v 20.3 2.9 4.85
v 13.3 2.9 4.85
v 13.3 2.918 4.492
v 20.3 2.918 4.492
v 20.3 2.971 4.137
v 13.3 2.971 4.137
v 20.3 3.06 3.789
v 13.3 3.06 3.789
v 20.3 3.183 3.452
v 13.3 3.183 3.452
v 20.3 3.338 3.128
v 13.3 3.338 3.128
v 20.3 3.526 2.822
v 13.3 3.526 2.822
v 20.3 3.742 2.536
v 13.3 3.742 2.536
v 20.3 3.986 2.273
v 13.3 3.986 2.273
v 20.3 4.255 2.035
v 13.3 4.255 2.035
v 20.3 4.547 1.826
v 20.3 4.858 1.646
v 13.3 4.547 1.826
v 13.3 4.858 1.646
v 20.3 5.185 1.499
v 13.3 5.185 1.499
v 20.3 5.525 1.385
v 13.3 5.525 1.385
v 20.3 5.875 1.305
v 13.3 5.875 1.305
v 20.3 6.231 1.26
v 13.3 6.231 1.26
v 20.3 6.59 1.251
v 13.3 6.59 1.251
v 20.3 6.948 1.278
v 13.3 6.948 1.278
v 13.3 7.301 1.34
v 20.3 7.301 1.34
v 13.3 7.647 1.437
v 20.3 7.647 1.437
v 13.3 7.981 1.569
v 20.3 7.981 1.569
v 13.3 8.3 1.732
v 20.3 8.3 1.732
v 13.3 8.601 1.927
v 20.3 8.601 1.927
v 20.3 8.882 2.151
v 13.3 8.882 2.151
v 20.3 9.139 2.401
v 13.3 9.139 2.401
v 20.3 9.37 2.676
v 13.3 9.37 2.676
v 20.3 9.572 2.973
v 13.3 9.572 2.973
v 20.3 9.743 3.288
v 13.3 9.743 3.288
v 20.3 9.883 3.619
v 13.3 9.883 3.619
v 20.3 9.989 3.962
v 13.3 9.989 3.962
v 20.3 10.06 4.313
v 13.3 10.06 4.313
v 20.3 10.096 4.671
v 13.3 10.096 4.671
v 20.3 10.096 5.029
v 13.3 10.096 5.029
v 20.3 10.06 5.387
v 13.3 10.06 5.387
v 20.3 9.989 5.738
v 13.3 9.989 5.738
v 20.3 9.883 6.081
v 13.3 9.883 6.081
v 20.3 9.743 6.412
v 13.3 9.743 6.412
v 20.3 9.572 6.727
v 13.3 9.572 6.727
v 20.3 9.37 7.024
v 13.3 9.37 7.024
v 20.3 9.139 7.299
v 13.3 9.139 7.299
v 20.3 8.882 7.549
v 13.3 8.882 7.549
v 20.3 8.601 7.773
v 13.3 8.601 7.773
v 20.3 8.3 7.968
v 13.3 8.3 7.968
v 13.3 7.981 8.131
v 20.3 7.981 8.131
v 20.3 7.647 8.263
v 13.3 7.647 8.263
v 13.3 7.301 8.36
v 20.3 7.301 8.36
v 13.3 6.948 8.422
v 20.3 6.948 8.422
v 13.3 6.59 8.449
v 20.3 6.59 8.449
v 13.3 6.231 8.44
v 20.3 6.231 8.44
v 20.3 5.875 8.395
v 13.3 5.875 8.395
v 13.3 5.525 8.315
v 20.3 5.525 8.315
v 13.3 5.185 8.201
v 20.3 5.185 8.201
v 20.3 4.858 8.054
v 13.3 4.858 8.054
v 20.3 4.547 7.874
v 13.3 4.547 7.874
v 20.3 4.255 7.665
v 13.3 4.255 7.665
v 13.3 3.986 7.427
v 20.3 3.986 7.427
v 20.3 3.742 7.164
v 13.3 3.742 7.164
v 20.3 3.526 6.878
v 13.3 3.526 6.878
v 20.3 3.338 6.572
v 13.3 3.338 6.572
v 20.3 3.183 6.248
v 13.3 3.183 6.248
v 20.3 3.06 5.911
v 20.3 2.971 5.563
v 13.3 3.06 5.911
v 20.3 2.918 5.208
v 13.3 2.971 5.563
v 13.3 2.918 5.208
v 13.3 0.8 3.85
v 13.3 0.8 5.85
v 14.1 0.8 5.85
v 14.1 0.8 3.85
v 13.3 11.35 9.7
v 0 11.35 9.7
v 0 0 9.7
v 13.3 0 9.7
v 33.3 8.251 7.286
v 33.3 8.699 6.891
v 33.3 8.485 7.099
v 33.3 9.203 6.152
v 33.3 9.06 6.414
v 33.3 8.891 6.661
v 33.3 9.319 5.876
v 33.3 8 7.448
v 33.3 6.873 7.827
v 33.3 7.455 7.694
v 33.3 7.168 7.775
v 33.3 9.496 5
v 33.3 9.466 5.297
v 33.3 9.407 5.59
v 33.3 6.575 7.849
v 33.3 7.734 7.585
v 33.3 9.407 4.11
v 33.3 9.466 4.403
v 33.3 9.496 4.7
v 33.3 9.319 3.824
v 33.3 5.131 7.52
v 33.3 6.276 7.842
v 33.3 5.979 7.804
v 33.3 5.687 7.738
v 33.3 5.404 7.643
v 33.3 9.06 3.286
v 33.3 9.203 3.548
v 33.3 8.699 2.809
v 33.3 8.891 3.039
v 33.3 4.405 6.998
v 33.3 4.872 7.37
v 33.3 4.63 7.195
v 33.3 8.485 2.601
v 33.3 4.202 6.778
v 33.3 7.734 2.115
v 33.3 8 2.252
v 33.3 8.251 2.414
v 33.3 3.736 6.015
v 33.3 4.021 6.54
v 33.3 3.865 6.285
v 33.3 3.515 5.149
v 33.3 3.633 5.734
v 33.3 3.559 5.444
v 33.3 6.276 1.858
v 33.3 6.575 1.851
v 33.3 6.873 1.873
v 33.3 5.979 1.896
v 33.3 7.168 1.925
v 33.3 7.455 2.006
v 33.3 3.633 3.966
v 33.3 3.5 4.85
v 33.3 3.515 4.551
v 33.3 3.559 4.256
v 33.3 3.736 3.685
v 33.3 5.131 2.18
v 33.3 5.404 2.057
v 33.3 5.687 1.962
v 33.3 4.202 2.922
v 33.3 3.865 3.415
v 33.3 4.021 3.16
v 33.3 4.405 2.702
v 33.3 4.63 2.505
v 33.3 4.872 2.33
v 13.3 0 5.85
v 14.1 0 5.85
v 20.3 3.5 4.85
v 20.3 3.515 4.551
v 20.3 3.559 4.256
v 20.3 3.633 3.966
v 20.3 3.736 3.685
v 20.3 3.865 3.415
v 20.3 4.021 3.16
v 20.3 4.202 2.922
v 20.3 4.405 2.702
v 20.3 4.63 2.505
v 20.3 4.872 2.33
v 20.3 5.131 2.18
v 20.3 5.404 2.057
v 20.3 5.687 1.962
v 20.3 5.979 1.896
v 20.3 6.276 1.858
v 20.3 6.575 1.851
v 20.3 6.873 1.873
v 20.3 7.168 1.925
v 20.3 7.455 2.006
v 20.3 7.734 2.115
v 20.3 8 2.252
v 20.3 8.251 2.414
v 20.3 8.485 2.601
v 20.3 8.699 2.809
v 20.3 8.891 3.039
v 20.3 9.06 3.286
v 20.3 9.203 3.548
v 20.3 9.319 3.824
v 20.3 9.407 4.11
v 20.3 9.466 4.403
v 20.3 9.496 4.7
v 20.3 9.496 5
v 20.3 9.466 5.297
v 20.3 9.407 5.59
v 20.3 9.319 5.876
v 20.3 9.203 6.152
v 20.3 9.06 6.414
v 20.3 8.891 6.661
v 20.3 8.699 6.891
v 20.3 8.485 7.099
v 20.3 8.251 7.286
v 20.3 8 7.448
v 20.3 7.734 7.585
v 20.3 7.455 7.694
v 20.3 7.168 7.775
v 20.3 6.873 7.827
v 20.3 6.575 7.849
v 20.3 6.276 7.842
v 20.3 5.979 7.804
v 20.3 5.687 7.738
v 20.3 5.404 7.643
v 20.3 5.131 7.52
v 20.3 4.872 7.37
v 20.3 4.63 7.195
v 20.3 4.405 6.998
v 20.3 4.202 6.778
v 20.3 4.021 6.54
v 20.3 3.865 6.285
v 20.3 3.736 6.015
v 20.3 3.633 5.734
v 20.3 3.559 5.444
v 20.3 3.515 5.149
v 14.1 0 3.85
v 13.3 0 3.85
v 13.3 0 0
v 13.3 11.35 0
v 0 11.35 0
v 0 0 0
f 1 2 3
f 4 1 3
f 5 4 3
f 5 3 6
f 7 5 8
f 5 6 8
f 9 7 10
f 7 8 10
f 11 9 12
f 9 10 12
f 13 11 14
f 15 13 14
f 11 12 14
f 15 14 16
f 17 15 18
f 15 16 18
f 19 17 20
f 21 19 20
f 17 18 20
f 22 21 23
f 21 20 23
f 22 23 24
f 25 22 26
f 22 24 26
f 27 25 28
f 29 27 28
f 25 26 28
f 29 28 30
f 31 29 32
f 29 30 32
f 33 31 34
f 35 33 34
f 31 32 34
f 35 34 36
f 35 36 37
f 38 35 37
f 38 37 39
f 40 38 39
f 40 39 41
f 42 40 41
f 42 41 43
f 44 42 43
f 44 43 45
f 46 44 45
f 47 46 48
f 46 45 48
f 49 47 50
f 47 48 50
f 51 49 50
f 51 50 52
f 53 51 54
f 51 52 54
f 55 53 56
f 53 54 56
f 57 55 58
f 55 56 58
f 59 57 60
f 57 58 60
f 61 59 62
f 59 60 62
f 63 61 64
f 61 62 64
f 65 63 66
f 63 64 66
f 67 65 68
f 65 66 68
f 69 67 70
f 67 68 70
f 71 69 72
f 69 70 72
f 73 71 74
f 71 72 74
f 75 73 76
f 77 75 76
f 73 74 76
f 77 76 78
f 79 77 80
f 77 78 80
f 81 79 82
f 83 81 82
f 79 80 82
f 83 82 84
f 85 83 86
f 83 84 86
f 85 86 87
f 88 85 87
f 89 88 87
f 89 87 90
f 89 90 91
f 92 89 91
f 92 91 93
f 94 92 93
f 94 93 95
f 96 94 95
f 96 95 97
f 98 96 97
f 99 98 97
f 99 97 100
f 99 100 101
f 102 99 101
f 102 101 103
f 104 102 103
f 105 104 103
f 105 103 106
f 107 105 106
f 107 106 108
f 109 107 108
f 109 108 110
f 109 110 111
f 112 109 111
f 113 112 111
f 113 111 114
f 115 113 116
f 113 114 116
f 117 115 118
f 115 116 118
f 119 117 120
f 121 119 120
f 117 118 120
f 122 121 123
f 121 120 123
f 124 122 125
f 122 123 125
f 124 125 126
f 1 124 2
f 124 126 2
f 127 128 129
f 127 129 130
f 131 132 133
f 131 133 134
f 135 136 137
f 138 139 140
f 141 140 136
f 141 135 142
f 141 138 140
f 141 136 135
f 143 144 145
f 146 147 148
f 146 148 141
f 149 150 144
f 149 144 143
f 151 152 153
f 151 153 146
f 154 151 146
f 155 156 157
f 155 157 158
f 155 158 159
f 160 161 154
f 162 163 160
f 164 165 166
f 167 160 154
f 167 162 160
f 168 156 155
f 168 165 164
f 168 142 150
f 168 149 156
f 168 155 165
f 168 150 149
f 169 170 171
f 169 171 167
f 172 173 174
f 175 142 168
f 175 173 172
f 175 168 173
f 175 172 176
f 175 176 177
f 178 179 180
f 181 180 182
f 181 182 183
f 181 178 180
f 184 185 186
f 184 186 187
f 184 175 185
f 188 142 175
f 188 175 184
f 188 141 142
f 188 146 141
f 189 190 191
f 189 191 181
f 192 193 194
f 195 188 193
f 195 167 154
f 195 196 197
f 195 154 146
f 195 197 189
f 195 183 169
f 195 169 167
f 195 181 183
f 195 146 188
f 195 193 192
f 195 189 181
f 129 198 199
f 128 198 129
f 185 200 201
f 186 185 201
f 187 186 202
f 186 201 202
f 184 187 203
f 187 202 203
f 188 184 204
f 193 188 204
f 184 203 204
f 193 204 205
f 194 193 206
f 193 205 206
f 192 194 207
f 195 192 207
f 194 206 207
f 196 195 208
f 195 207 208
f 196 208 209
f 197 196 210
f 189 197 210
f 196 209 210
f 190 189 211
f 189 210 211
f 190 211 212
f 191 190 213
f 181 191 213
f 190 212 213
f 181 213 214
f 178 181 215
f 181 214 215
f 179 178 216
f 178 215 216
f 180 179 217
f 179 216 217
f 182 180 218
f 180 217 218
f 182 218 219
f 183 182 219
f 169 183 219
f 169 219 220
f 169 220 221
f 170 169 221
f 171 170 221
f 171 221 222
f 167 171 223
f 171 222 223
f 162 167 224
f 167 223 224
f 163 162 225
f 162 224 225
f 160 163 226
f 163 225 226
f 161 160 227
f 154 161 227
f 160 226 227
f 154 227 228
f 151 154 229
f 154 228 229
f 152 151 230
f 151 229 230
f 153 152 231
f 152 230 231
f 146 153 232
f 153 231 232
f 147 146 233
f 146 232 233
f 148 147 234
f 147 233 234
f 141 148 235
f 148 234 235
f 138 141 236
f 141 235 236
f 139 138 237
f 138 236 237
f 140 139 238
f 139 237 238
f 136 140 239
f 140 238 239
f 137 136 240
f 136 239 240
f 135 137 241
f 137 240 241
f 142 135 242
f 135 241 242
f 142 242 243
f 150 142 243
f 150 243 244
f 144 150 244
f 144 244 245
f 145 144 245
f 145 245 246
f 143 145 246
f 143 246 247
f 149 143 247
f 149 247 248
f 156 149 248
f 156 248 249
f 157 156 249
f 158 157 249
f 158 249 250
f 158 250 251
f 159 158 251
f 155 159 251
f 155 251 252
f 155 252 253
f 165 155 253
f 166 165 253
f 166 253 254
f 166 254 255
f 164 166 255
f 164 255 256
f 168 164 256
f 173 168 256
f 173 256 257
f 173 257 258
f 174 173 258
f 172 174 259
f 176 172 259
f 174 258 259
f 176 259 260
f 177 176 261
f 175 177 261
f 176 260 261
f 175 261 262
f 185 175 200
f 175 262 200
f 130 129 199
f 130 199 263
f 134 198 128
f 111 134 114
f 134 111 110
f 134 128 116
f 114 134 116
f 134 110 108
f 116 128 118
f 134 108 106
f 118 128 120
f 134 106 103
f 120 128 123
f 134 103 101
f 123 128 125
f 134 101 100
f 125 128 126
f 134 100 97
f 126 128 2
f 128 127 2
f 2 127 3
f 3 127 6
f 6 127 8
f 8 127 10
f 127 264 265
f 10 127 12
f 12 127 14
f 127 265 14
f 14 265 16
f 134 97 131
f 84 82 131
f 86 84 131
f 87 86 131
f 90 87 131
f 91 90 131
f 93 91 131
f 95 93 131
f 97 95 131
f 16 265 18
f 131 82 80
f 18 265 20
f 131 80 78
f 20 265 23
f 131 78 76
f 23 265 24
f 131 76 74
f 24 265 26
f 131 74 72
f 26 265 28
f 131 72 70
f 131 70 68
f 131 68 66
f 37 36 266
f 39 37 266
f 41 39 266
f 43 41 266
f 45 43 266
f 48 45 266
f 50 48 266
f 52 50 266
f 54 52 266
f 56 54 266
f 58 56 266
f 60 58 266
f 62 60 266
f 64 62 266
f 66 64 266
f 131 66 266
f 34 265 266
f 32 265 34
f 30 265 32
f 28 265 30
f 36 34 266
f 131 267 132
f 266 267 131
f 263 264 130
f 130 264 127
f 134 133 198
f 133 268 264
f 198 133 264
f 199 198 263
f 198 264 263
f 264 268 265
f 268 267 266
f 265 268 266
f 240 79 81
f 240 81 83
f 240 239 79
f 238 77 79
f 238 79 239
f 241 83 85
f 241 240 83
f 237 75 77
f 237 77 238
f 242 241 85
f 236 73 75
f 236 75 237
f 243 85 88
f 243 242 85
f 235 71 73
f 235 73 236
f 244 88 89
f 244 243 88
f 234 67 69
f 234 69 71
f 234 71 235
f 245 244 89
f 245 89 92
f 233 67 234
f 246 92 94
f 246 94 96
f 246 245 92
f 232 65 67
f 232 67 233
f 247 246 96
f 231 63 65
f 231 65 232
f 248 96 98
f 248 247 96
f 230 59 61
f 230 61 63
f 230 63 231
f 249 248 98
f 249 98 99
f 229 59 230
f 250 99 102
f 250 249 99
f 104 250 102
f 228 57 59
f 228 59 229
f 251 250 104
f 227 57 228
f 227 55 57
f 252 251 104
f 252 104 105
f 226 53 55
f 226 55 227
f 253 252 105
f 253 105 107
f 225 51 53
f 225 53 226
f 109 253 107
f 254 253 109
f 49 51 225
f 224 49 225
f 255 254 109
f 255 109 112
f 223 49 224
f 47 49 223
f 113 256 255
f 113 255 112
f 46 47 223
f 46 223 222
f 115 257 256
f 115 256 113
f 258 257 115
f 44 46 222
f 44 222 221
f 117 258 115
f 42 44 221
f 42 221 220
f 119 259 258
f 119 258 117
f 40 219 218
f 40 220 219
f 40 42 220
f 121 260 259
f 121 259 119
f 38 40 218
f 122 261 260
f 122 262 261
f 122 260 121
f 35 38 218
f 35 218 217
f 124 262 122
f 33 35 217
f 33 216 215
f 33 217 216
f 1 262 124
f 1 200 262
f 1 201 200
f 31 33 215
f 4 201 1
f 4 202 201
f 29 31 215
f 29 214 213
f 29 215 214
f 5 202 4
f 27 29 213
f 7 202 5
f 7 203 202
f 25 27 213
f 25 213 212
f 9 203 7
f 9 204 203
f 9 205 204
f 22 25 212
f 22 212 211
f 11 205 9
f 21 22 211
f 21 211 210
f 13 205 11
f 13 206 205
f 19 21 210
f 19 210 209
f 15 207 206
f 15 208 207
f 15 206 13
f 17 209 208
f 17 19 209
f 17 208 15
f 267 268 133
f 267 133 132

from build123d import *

# Parameters (mm, degrees)
SKETCH1_W           = 13.3
SKETCH1_H           = 11.35
BOSS_EXTRUDE1_DEPTH = 9.7
SKETCH2_R           = 3.6
BOSS_EXTRUDE2_DEPTH = 7
SKETCH3_R           = 3
BOSS_EXTRUDE4_DEPTH = 13
SKETCH4_W           = 2
SKETCH4_H           = 0.8
BOSS_EXTRUDE5_DEPTH = 0.8


with BuildPart() as part:
    # Sketch1 → Boss-Extrude1 (new body)
    with BuildSketch(Plane.XY):
        with Locations((6.65, 5.675)):
            Rectangle(SKETCH1_W, SKETCH1_H)
    extrude(amount=BOSS_EXTRUDE1_DEPTH)

    # Sketch2 → Boss-Extrude2 (add)
    with BuildSketch(Plane(origin=(13.3, 0, 0), x_dir=(0, 0, -1), z_dir=(1, 0, 0))):
        with Locations(Location((-4.85, 6.5, 0), (0, 0, 270))):  # turned: the seam where the file's is
            Circle(SKETCH2_R)
    extrude(amount=BOSS_EXTRUDE2_DEPTH)

    # Sketch3 → Boss-Extrude4 (add)
    with BuildSketch(Plane(origin=(20.3, 0, 0), x_dir=(0, 0, -1), z_dir=(1, 0, 0))):
        with Locations(Location((-4.85, 6.5, 0), (0, 0, 270))):  # turned: the seam where the file's is
            Circle(SKETCH3_R)
    extrude(amount=BOSS_EXTRUDE4_DEPTH)

    # Sketch4 → Boss-Extrude5 (add)
    with BuildSketch(Plane(origin=(13.3, 0, 0), x_dir=(0, 0, -1), z_dir=(1, 0, 0))):
        with Locations((-4.85, 0.4)):
            Rectangle(SKETCH4_W, SKETCH4_H)
    extrude(amount=BOSS_EXTRUDE5_DEPTH)


solid = part.part
